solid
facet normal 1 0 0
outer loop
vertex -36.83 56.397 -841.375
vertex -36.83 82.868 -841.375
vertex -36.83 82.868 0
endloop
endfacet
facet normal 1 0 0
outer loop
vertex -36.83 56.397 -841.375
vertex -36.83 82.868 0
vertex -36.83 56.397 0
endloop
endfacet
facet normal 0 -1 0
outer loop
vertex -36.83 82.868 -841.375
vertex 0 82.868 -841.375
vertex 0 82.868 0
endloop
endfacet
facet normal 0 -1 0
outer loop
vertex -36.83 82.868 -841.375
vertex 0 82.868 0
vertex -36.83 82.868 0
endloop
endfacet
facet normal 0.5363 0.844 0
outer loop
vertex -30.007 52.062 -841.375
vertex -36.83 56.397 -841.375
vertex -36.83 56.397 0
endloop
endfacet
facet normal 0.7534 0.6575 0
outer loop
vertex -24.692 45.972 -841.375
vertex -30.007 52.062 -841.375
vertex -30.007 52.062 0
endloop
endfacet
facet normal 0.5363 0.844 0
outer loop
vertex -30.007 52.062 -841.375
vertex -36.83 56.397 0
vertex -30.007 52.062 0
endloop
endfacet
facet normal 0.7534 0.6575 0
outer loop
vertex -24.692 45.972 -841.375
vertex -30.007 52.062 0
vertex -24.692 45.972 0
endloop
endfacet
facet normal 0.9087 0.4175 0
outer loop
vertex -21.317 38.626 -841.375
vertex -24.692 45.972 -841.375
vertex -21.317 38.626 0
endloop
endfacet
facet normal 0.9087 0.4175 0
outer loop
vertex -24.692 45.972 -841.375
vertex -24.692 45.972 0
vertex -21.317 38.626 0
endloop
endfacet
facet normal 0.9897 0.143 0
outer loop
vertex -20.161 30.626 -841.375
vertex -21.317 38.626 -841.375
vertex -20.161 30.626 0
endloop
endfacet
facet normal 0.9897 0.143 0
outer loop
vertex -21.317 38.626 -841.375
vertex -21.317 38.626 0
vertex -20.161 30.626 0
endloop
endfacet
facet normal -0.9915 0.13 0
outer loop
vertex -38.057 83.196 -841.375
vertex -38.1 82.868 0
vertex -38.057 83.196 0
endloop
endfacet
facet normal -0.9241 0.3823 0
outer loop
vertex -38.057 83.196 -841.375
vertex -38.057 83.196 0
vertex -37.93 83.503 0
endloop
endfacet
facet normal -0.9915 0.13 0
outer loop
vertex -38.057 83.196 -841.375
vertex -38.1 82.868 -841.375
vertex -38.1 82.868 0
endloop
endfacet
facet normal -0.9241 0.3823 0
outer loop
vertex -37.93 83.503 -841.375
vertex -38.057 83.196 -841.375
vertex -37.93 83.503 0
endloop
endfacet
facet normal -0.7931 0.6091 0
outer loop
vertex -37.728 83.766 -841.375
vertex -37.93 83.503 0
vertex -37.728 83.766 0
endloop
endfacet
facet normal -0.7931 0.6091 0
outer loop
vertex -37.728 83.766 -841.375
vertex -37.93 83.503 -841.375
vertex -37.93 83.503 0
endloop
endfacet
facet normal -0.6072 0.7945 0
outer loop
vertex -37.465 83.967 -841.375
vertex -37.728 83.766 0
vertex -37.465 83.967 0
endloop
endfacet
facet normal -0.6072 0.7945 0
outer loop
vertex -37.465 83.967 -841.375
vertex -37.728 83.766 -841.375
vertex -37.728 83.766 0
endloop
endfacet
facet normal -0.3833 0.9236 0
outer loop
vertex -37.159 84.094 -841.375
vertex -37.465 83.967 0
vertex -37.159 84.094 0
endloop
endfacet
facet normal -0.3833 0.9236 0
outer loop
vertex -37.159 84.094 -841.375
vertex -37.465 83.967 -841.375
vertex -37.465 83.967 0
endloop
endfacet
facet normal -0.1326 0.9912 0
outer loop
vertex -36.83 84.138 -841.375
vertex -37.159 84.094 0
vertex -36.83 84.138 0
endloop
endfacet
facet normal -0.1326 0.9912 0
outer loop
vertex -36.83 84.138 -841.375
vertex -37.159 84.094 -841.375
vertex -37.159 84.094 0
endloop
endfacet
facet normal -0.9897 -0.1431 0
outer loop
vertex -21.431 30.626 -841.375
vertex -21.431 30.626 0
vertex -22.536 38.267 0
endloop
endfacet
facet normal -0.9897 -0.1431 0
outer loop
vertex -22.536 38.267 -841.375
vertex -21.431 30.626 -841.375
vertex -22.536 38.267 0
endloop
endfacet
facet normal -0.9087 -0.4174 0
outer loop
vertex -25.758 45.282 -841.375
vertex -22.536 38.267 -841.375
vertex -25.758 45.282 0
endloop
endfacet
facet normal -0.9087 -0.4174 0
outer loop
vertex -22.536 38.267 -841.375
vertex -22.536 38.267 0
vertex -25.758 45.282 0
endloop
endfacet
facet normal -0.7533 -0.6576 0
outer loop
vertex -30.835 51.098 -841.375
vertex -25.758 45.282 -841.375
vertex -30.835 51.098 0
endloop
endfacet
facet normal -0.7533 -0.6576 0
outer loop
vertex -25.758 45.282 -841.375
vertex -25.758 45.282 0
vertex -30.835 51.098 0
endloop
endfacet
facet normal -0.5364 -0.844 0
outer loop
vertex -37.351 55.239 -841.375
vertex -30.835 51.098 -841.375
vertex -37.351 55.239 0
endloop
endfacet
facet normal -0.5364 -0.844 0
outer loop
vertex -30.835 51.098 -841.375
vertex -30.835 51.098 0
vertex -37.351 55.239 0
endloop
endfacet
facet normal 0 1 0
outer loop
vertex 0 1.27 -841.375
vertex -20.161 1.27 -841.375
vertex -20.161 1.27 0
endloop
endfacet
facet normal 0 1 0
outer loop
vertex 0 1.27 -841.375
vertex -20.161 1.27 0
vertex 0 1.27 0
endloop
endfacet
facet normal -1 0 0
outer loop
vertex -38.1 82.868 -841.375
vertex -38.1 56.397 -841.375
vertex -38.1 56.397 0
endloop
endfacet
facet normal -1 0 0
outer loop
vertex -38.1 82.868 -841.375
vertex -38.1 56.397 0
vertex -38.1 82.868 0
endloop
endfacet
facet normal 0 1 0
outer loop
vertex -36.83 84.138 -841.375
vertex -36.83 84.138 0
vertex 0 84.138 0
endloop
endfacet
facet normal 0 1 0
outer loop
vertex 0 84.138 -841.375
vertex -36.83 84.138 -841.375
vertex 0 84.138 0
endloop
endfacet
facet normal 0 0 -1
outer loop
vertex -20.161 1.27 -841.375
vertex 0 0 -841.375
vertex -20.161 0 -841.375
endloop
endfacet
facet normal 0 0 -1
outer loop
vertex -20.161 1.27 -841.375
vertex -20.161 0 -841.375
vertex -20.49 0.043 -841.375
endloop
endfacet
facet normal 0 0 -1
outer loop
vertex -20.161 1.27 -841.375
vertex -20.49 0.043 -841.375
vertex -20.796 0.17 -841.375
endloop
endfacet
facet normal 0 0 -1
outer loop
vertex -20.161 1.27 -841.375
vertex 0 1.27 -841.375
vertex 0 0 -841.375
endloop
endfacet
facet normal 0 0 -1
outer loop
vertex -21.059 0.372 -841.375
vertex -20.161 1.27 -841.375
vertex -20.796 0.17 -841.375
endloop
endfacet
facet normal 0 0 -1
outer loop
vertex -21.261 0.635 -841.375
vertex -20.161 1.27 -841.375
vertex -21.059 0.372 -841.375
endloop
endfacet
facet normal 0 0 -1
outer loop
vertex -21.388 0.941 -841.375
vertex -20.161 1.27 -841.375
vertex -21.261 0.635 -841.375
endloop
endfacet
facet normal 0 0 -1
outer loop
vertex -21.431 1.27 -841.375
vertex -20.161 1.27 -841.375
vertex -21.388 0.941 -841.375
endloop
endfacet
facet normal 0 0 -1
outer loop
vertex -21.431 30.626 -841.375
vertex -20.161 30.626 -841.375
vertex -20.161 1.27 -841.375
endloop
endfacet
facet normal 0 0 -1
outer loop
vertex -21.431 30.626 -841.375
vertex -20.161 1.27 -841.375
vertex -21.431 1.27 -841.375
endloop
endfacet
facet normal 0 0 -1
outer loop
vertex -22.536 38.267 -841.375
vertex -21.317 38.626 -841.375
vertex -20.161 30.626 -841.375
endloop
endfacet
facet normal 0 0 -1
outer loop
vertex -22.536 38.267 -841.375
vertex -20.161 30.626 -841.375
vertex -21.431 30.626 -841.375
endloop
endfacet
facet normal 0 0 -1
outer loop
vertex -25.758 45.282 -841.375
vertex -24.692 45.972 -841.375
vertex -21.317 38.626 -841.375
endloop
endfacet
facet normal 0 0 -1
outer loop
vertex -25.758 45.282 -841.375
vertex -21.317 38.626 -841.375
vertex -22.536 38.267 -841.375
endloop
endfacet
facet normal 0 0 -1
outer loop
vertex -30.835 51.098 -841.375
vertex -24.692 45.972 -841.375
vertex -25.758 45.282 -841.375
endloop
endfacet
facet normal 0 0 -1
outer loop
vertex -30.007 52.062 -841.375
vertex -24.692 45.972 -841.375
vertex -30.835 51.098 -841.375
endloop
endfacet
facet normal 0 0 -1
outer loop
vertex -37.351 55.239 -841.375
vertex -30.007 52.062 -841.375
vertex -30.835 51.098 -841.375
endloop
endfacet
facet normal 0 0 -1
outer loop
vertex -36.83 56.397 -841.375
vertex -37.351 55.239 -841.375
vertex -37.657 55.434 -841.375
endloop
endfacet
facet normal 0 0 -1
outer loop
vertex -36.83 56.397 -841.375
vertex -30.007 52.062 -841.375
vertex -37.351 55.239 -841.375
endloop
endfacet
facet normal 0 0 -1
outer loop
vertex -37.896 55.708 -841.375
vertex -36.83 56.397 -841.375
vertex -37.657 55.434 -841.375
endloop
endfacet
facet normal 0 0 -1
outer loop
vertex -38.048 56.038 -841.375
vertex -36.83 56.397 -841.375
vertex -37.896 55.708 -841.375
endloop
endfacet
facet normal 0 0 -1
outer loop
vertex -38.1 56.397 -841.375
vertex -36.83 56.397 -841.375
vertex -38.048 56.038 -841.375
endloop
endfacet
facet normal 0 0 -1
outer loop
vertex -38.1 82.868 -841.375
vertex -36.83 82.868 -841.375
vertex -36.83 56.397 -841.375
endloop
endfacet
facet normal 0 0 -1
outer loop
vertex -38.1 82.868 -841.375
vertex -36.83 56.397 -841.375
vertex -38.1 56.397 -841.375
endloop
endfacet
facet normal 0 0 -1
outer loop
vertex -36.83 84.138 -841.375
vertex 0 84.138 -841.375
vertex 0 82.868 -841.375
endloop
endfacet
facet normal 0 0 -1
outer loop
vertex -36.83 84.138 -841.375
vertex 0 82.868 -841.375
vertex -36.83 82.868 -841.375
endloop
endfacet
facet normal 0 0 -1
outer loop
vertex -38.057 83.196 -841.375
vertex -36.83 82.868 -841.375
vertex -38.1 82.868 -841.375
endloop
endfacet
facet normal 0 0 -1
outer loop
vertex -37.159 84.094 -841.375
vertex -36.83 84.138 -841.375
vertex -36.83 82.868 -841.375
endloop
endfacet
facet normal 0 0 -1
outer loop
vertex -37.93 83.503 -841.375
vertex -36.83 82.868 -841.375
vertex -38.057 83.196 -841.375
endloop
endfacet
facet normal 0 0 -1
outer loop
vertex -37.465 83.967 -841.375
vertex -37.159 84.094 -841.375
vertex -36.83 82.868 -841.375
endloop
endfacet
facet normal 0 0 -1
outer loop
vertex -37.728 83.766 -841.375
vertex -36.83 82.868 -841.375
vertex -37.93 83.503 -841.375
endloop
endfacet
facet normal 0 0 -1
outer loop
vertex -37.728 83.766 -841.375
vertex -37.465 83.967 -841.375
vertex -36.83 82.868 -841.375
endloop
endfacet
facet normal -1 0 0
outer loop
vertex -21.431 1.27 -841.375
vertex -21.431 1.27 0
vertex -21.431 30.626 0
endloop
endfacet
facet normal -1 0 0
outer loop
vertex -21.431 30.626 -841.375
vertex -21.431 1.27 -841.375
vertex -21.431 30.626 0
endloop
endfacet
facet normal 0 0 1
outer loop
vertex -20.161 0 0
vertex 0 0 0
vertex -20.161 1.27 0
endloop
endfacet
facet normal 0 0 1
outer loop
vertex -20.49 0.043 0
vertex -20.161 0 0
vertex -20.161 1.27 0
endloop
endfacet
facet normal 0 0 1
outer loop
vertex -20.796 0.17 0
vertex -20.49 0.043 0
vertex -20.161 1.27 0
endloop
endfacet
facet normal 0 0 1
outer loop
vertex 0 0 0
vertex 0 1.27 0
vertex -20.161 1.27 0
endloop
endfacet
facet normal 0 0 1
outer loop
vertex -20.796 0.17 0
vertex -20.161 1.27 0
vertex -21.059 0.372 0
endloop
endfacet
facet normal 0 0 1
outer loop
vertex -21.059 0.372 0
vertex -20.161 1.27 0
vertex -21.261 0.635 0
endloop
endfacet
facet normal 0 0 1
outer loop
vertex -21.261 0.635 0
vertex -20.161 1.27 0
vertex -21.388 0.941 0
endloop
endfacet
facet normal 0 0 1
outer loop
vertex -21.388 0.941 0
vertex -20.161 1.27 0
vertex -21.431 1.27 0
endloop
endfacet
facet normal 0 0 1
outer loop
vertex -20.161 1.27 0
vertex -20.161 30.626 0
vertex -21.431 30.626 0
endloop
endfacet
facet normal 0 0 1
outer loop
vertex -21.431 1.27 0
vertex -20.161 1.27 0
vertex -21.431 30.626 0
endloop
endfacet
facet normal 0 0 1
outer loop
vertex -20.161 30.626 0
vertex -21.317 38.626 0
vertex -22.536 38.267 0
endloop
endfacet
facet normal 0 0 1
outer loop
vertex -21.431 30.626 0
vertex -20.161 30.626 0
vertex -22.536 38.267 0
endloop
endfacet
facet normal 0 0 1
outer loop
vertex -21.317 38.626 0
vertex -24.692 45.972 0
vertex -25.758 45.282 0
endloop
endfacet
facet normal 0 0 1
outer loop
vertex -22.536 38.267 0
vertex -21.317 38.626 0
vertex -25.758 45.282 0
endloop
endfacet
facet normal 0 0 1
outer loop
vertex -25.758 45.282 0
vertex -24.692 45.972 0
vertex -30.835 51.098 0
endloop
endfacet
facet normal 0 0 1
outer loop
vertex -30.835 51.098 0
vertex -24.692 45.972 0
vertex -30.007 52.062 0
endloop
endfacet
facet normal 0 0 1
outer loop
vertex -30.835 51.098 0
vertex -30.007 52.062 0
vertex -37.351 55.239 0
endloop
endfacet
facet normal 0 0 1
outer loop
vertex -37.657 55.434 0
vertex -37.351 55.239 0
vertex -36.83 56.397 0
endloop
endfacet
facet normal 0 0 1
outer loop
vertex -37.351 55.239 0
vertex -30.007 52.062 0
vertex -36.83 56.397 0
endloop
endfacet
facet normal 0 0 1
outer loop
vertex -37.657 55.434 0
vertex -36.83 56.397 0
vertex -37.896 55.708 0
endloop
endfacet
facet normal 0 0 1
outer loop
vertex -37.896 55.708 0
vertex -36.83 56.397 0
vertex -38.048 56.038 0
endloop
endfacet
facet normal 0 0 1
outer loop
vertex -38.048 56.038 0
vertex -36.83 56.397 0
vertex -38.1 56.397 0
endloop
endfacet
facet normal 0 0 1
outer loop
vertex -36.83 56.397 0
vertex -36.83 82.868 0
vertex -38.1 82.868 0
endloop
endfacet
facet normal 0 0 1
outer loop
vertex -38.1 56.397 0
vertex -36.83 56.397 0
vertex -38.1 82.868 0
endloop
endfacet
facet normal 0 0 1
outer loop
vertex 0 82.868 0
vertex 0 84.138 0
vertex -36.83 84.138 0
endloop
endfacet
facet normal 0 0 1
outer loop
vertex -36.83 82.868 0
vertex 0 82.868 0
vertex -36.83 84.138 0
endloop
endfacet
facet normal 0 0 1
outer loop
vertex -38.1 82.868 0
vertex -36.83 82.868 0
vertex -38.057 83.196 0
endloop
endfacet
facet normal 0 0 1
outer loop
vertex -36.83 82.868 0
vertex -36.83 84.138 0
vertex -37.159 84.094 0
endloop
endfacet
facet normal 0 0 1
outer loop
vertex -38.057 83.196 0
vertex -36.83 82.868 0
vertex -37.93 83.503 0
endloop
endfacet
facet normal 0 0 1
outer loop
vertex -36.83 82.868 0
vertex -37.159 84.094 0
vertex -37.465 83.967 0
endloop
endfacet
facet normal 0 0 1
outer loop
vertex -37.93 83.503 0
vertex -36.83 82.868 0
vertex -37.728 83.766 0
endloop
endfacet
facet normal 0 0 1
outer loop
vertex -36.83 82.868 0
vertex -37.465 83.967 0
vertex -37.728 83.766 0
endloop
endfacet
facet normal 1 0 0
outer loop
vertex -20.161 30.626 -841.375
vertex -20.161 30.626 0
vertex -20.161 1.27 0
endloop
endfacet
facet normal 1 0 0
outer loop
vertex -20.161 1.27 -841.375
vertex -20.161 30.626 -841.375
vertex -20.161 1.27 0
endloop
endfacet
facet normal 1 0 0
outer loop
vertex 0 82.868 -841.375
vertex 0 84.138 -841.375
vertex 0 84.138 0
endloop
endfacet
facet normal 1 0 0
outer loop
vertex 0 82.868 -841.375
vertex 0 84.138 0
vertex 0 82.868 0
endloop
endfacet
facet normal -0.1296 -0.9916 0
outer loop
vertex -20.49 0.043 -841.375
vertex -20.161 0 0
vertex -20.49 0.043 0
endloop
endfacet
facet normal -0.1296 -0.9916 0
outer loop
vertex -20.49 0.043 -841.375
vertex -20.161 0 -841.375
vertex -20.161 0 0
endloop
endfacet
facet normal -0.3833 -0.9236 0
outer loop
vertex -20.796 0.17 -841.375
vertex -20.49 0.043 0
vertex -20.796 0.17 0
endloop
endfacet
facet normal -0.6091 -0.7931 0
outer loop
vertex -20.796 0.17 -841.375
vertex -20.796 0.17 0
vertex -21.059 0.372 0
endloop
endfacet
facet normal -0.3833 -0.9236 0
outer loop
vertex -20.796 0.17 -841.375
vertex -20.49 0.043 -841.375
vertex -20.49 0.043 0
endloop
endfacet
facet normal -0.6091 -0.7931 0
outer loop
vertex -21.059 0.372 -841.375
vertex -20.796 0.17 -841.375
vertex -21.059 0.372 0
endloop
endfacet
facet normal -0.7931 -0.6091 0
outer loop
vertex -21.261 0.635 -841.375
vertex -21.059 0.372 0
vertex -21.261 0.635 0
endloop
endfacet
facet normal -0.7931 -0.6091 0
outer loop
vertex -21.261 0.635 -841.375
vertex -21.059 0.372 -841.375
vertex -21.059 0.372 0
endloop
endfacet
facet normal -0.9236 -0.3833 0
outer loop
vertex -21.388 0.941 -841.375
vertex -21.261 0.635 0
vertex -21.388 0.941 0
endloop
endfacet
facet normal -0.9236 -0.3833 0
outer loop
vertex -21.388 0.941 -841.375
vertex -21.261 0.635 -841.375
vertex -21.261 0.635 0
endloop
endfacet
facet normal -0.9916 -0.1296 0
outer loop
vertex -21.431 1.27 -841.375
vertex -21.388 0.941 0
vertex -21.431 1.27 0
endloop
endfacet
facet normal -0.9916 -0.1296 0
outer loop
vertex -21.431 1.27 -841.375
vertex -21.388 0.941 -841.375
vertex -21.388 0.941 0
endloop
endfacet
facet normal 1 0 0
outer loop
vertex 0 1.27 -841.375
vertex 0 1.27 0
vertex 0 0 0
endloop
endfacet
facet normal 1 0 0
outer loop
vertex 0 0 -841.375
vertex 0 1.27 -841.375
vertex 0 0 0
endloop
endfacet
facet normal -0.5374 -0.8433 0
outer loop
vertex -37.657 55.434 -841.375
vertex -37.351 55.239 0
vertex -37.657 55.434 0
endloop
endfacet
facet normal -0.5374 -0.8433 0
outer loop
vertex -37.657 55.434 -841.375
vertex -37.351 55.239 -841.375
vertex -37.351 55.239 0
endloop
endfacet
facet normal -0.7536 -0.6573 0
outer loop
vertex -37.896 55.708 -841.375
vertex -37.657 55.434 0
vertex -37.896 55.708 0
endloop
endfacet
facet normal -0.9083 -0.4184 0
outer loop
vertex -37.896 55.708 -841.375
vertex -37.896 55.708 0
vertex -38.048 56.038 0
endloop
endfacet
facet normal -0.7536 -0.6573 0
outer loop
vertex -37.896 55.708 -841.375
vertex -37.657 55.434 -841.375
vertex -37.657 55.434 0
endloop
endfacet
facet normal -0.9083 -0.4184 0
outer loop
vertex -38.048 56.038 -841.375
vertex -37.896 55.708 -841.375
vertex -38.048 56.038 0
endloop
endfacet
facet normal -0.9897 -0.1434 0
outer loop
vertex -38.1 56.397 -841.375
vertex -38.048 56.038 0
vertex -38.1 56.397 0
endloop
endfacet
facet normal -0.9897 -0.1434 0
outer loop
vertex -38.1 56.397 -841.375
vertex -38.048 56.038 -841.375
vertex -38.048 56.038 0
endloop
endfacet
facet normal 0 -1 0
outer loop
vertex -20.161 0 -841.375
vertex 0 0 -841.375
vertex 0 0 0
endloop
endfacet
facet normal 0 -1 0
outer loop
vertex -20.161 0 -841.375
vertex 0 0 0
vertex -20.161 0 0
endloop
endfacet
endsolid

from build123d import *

# Parameters (mm, degrees)
EXTRUDE_THIN1_DEPTH = 841.375
FILLET1_R           = 1.27


with BuildPart() as part:
    # Sketch1 → Extrude-Thin1 (new body)
    with BuildSketch(Plane.XY):
        with BuildLine():
            Line((0, 0), (-21.43125, 0))
            Line((-21.43125, 0), (-21.43125, 30.62560856))
            ThreePointArc((-21.43125, 30.62560856), (-25.982145735, 45.62307319), (-38.1, 55.5625))
            Line((-38.1, 55.5625), (-38.1, 84.1375))
            Line((-38.1, 84.1375), (0, 84.1375))
            Line((0, 84.1375), (0, 82.8675))
            Line((0, 82.8675), (-36.83, 82.8675))
            Line((-36.83, 82.8675), (-36.83, 56.397437748))
            ThreePointArc((-36.83, 56.397437748), (-24.691598787, 45.971898065), (-20.16125, 30.62560856))
            Line((-20.16125, 30.62560856), (-20.16125, 1.27))
            Line((-20.16125, 1.27), (0, 1.27))
            Line((0, 1.27), (0, 0))
        make_face()
    extrude(amount=-EXTRUDE_THIN1_DEPTH)

    # Fillet1
    fillet1_edges = [part.edges().sort_by_distance(p)[0] for p in [
        (-21.43125, 0, -420.6875),
        (-38.1, 55.5625, -420.6875),
        (-38.1, 84.1375, -420.6875),
    ]]
    fillet(fillet1_edges, radius=FILLET1_R)


solid = part.part
